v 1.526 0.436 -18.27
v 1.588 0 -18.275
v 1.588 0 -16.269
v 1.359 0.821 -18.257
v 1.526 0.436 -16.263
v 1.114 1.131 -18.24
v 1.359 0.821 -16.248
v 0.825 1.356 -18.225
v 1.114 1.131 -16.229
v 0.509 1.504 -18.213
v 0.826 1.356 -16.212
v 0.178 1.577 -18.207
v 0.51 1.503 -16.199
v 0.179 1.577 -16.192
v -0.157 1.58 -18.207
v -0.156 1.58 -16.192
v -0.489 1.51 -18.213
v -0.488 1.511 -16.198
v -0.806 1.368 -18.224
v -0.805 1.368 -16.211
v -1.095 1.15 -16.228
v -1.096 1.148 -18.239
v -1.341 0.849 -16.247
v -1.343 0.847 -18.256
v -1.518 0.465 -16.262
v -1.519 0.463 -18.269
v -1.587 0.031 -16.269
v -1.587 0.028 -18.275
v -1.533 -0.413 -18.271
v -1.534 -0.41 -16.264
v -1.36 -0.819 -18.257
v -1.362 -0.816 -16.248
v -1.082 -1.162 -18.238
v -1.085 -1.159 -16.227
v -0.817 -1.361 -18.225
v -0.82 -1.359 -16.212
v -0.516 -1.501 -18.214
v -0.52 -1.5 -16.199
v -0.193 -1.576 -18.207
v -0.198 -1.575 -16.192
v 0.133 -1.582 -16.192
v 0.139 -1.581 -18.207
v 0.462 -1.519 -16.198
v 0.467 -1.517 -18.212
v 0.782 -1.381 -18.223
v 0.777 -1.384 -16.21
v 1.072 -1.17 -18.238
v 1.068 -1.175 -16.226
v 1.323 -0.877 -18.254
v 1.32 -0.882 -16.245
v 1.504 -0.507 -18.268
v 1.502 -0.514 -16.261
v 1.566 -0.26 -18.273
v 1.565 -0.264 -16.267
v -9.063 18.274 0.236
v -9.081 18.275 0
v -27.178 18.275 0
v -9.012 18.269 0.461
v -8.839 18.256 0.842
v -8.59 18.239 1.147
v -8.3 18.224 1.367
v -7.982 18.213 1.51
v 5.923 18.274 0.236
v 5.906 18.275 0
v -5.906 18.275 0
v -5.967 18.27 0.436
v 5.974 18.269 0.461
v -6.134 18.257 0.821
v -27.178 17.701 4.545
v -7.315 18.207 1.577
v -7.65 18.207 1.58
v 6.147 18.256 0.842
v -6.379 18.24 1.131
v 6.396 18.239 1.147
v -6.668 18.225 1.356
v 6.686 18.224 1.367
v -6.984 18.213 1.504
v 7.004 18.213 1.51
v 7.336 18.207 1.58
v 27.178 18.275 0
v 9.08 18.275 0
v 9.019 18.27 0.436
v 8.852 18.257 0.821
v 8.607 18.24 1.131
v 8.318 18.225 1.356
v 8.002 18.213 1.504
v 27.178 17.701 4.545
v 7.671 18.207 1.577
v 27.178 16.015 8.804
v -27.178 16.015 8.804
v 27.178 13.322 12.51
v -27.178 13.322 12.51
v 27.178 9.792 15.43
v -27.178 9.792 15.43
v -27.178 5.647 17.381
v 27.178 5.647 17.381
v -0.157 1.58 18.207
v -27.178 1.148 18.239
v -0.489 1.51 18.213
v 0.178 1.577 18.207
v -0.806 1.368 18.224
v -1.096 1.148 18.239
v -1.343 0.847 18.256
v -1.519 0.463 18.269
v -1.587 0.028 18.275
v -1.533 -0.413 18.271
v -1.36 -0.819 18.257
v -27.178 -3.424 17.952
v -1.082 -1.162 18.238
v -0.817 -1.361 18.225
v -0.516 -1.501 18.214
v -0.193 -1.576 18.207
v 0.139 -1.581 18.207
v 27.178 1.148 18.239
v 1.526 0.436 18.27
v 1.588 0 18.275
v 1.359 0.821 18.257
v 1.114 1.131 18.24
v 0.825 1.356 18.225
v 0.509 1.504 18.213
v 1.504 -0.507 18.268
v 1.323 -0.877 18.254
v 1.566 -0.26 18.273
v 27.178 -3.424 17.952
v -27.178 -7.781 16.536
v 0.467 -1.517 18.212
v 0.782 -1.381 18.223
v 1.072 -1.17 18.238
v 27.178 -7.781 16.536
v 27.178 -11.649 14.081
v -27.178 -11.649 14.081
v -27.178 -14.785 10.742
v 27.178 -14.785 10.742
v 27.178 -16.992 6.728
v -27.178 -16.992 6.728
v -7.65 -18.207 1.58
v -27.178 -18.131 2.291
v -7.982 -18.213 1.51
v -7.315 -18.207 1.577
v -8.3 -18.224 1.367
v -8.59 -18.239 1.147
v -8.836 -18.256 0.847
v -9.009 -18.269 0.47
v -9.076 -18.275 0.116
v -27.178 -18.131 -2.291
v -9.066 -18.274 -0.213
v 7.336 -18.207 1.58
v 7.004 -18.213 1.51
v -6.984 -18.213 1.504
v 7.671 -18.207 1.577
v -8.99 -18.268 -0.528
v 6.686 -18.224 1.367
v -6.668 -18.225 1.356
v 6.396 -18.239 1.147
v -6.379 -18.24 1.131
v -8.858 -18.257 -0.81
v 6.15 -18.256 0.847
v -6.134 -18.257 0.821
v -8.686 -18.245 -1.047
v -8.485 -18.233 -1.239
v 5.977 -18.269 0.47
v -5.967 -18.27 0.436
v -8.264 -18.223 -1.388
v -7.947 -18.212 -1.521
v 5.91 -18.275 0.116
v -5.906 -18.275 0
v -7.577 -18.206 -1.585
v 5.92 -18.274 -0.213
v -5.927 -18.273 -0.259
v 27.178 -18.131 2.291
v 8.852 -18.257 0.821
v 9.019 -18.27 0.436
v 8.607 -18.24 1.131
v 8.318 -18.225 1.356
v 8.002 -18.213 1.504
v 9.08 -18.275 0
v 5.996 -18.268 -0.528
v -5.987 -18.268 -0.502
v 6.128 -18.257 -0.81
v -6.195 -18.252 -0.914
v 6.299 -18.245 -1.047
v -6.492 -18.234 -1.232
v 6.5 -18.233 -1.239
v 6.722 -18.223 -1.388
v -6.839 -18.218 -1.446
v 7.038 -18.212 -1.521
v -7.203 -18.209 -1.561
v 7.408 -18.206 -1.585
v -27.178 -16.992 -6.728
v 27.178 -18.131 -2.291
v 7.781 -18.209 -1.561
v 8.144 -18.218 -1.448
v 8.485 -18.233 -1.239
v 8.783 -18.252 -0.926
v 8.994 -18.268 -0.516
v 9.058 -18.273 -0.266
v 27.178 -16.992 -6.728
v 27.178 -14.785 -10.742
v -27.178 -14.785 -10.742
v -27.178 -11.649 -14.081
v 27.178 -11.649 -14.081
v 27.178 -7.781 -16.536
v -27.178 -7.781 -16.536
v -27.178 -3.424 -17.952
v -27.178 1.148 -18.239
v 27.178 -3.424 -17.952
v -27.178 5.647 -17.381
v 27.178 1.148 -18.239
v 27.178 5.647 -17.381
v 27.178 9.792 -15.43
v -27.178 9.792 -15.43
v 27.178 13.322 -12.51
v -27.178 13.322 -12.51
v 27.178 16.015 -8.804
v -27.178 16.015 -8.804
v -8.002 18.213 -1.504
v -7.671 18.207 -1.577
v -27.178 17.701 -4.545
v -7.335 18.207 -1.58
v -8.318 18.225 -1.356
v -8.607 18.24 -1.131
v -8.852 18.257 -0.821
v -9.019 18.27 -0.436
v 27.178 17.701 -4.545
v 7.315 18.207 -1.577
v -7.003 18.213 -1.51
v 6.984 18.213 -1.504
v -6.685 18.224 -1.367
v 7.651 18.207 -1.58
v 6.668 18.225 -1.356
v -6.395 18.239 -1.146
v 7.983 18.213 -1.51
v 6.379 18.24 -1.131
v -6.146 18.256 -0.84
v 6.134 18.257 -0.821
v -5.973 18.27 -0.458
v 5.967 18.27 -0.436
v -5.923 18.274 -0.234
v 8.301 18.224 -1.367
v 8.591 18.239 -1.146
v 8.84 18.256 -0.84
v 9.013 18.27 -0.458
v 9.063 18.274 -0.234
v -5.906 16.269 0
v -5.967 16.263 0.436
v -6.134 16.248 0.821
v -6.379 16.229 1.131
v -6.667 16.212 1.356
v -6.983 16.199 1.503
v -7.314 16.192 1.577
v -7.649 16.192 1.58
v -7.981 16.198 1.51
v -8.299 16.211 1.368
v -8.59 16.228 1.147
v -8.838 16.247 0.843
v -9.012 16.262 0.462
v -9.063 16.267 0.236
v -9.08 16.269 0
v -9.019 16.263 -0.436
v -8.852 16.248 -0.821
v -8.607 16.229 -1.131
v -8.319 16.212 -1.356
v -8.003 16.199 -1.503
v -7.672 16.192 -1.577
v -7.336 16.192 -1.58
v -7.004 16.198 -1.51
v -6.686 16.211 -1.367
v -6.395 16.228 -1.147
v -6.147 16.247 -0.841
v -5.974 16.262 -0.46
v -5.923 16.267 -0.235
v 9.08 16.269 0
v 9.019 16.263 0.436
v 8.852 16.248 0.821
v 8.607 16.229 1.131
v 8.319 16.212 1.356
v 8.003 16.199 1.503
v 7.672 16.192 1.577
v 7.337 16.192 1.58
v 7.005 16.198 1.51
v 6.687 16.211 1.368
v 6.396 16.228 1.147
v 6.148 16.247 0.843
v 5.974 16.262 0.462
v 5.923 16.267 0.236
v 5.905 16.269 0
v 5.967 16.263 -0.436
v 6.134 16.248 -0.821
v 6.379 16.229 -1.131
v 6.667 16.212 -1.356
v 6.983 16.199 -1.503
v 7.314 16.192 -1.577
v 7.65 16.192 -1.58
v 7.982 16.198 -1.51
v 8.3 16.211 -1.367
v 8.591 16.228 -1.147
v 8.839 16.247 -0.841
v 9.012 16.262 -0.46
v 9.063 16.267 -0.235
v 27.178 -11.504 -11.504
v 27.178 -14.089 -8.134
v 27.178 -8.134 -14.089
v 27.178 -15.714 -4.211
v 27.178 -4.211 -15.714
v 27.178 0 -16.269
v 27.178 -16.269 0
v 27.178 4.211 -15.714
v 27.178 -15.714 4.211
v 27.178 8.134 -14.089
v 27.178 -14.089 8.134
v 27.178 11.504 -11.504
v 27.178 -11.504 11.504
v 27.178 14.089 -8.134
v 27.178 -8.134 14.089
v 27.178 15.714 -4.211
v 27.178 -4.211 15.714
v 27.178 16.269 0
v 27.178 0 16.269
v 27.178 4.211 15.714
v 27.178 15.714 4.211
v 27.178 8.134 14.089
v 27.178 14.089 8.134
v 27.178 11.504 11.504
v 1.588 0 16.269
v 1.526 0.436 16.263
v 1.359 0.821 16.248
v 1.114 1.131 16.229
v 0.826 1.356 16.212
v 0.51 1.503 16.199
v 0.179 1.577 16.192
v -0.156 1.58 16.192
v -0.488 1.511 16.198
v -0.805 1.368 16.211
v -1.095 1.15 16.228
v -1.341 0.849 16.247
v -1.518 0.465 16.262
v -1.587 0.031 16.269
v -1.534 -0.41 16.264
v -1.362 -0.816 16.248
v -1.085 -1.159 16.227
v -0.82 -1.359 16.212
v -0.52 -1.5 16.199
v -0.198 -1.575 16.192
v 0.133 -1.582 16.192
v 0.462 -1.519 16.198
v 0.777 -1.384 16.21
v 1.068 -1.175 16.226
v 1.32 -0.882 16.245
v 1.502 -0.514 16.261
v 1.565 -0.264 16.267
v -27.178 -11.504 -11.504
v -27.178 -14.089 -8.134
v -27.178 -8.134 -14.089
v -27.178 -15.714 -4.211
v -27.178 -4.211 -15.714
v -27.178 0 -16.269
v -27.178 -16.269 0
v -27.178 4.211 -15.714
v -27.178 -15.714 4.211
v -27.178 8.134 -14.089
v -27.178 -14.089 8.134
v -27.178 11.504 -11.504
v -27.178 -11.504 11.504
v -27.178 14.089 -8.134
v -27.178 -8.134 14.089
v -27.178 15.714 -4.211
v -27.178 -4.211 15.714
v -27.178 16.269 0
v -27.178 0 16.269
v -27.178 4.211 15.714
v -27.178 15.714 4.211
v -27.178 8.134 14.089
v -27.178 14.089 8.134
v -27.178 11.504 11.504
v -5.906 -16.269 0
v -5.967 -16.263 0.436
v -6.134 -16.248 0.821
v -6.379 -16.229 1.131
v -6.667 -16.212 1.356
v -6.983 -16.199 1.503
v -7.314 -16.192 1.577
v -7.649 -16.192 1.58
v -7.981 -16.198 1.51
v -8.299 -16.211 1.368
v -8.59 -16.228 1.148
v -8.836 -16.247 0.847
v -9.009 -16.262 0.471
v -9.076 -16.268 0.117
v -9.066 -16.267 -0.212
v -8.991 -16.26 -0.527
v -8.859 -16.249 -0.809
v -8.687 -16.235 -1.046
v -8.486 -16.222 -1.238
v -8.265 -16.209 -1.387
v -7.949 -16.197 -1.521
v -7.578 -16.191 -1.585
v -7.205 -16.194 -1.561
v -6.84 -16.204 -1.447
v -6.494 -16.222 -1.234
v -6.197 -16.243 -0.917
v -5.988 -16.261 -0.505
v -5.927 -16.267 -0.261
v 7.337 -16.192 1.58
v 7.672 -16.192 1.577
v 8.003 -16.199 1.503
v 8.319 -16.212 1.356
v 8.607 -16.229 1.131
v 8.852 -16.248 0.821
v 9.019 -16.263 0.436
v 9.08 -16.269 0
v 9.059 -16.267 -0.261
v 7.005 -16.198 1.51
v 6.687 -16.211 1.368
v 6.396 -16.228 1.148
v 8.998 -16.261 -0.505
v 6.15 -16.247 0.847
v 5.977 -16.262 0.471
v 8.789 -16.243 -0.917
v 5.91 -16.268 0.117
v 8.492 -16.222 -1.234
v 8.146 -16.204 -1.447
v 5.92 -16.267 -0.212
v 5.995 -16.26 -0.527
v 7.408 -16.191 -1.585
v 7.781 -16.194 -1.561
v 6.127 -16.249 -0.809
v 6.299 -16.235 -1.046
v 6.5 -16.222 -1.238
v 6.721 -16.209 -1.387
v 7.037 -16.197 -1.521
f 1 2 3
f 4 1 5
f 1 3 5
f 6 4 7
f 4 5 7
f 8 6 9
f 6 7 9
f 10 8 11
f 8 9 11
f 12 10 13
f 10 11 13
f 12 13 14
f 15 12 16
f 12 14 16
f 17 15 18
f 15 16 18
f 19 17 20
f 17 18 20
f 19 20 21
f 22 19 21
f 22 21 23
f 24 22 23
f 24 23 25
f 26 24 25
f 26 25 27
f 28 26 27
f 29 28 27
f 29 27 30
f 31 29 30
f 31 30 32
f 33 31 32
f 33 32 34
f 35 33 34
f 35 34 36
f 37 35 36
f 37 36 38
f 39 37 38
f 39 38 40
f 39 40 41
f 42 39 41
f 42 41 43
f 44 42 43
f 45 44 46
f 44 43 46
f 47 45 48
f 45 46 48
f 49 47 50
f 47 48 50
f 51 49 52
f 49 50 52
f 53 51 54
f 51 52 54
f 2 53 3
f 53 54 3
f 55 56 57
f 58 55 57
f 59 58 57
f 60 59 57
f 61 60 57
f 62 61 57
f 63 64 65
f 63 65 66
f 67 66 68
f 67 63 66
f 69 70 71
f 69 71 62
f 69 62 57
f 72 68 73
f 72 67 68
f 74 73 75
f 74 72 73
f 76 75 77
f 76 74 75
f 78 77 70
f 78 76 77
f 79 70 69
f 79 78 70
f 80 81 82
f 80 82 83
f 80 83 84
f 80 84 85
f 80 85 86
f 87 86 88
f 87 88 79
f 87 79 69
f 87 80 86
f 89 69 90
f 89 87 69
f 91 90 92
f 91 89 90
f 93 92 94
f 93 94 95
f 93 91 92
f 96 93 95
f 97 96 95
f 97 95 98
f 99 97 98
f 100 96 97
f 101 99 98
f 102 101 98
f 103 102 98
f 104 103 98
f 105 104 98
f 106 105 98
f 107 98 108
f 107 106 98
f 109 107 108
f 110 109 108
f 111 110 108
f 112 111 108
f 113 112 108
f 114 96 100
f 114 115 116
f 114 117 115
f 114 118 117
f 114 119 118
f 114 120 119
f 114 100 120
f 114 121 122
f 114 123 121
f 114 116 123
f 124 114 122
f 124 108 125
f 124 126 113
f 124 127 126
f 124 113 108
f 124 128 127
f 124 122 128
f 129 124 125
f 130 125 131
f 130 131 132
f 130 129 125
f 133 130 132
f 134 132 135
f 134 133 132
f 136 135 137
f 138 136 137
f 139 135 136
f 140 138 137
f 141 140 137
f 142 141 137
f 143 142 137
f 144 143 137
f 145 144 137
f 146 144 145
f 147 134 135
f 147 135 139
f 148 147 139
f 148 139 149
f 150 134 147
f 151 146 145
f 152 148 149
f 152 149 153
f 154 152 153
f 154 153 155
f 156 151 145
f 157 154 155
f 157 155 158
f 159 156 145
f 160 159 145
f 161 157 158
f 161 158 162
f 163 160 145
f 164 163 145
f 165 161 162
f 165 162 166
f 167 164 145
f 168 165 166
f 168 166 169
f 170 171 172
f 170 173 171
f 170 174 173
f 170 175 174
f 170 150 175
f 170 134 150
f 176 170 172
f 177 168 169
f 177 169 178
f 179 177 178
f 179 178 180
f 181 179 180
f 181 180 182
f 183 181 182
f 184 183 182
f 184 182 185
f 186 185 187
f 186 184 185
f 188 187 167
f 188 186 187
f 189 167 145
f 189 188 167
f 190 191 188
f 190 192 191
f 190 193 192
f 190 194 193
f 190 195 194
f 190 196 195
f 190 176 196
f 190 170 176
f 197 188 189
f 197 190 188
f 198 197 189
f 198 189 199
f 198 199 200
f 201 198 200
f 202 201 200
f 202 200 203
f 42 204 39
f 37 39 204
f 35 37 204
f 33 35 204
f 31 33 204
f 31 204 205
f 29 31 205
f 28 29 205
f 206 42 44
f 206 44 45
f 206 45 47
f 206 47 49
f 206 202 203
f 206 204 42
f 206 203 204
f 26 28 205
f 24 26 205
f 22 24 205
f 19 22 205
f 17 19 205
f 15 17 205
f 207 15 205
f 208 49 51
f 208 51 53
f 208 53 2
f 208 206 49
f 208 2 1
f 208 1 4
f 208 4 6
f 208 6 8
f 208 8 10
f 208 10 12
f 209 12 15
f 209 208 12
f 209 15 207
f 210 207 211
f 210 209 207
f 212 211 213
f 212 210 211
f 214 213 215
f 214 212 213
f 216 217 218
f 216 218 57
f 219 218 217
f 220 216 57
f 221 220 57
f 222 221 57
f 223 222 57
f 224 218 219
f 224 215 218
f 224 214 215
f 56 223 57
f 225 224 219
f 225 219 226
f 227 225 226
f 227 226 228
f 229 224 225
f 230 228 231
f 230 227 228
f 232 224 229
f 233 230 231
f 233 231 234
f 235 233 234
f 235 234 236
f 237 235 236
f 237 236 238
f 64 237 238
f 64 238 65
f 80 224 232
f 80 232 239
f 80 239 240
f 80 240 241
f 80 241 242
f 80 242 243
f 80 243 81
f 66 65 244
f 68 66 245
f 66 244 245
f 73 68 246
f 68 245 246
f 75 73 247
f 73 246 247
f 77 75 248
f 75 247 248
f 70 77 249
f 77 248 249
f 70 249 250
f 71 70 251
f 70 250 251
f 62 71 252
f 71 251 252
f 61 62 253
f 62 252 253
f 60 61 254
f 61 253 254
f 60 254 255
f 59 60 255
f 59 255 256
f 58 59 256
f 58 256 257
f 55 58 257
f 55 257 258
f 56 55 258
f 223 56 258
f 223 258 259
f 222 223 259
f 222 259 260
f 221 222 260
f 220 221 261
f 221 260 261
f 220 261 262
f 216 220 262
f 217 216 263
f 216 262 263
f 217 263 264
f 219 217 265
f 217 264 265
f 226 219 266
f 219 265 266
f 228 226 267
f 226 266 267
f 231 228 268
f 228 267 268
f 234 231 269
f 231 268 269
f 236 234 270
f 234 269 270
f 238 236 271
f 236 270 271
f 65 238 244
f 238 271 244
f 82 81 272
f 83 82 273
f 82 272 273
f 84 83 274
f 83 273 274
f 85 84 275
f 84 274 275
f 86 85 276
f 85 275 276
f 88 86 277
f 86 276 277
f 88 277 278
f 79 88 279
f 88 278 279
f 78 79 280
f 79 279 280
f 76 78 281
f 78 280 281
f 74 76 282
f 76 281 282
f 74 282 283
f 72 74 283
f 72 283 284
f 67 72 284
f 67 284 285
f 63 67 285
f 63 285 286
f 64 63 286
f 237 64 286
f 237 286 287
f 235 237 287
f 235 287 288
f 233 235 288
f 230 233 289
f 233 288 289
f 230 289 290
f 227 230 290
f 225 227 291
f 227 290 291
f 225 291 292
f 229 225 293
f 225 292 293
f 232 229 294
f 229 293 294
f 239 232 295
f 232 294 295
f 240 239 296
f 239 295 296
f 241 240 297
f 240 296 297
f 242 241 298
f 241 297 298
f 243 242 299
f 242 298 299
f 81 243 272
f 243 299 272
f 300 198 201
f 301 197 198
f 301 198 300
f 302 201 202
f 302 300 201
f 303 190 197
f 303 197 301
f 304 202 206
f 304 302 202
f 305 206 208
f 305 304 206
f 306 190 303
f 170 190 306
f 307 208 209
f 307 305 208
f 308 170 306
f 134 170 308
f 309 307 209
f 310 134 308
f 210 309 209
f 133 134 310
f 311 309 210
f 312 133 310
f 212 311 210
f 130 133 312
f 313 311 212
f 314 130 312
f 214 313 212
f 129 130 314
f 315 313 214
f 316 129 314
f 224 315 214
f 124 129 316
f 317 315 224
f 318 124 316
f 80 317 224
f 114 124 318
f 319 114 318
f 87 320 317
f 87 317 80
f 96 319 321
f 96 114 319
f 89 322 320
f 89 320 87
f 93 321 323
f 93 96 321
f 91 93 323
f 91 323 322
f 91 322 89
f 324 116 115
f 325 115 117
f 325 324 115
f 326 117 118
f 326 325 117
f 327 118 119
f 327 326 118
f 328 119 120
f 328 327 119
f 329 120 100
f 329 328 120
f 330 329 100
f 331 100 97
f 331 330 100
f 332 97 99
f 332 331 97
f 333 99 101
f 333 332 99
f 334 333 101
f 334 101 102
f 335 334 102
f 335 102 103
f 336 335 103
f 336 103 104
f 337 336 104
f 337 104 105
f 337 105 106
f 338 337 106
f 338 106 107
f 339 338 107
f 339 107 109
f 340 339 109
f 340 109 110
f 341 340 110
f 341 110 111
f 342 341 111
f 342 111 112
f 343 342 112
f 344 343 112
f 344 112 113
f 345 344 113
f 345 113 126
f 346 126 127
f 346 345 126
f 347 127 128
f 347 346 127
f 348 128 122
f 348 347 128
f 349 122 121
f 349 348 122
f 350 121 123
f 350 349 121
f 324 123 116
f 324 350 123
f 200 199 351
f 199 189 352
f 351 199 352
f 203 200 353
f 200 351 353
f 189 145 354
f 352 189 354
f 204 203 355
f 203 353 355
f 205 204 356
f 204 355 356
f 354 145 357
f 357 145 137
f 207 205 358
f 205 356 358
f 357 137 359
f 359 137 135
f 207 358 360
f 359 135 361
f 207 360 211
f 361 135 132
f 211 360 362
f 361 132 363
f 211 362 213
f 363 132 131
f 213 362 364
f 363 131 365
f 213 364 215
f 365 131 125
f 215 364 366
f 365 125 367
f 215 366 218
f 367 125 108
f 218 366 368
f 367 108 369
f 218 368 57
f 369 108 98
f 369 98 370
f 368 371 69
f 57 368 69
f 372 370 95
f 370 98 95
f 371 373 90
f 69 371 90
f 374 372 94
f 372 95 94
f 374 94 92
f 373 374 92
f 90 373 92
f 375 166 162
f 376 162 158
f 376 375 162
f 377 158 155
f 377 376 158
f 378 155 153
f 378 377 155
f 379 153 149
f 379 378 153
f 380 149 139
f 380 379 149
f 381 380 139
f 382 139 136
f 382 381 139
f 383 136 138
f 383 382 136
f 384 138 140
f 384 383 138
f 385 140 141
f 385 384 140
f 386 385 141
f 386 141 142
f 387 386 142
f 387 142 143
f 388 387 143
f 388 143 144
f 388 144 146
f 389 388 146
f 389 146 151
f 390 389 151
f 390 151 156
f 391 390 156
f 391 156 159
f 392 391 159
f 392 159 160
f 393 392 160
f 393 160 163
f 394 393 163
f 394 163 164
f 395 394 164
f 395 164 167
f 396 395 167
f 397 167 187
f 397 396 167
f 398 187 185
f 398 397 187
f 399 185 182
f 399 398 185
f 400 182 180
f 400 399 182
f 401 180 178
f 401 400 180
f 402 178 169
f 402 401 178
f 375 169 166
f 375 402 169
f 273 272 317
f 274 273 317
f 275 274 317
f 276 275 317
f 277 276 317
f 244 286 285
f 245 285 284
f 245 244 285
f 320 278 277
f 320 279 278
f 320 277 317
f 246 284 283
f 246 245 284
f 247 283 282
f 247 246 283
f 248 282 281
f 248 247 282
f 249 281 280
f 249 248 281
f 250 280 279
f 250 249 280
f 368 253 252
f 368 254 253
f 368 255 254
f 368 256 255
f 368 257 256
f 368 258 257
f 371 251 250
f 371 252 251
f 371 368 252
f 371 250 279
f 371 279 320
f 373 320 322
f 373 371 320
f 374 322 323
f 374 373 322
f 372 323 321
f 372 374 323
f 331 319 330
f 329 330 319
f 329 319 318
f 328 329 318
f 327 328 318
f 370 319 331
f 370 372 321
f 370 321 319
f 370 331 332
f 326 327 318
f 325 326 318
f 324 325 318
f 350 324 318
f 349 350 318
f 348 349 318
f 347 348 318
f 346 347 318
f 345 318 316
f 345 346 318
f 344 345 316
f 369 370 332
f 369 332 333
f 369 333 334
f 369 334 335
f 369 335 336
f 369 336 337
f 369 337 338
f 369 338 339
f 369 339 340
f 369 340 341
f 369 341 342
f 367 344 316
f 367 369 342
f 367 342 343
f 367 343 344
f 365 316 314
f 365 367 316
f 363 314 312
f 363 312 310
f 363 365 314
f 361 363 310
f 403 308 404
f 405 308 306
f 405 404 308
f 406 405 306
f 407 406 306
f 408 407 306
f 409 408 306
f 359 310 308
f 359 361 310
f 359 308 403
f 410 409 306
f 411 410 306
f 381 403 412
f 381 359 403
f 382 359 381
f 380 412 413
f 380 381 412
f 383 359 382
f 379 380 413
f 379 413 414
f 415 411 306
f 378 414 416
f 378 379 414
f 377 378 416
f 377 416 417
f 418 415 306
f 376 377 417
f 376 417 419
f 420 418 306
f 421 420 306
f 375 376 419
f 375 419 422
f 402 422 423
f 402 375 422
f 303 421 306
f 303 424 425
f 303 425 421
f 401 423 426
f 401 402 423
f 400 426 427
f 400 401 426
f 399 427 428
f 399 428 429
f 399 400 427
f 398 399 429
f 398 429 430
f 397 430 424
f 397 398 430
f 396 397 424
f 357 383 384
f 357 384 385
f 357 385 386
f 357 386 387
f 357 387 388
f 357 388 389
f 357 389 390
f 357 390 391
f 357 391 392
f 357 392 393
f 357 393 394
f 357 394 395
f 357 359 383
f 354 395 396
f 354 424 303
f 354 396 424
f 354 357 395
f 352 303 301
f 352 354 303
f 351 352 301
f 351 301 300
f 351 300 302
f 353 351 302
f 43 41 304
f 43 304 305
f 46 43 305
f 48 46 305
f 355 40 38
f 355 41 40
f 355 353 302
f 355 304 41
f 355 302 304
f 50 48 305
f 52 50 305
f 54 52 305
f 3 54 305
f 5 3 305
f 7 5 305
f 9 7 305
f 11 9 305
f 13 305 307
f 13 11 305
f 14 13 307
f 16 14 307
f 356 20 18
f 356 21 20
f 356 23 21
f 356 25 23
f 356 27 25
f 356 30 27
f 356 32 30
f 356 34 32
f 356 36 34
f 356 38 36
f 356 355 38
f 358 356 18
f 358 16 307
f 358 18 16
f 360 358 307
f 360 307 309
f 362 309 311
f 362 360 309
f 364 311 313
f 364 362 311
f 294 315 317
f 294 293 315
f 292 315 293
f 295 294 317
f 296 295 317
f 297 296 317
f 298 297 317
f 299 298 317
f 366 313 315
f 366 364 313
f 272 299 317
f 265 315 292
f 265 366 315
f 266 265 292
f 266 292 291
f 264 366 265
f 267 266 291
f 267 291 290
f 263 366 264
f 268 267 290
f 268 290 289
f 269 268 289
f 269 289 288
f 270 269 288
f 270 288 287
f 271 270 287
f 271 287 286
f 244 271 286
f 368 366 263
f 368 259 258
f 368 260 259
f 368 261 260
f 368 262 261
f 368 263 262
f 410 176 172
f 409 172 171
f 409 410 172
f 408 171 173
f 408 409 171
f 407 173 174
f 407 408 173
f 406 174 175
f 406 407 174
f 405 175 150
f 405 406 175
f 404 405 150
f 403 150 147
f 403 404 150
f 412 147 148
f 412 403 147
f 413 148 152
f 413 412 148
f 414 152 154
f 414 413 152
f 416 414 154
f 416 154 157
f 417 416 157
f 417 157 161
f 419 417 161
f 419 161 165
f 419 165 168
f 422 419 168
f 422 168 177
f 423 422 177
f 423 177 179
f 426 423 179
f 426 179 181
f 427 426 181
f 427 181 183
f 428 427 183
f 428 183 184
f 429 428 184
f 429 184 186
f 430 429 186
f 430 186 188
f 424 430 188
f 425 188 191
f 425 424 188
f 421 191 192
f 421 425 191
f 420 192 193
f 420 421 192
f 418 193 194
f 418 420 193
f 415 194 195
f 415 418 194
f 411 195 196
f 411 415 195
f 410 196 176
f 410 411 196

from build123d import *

# Parameters (mm, degrees)
F0_R          = 18.2753
F0_R_2        = 16.2687
F1_DEPTH      = 27.178
F2_R          = 1.5875
F3_DEPTH      = 18.2763
F3_DEPTH_BACK = 18.2763
F4_R          = 1.5875
F5_DEPTH      = 18.2763001
F5_DEPTH_BACK = 18.2763001


with BuildPart() as f1:
    # F0 (on Right) → F1 (new body, symmetric)
    with BuildSketch(Plane.YZ):
        Circle(F0_R)
        Circle(F0_R_2, mode=Mode.SUBTRACT)
    extrude(amount=F1_DEPTH, both=True)

    # F2 (on Top) → F3 (cut, two sides)
    with BuildSketch(Plane.XY) as f3_sk:
        Circle(F2_R)
    extrude(amount=-F3_DEPTH, mode=Mode.SUBTRACT)
    extrude(f3_sk.sketch, amount=F3_DEPTH_BACK, mode=Mode.SUBTRACT)

    # F4 (on Front) → F5 (cut, two sides)
    with BuildSketch(Plane.XZ) as f5_sk:
        with Locations((-7.493, 0)):
            Circle(F4_R)
        with Locations((7.493, 0)):
            Circle(F4_R)
    extrude(amount=-F5_DEPTH, mode=Mode.SUBTRACT)
    extrude(f5_sk.sketch, amount=F5_DEPTH_BACK, mode=Mode.SUBTRACT)


solid = f1.part
